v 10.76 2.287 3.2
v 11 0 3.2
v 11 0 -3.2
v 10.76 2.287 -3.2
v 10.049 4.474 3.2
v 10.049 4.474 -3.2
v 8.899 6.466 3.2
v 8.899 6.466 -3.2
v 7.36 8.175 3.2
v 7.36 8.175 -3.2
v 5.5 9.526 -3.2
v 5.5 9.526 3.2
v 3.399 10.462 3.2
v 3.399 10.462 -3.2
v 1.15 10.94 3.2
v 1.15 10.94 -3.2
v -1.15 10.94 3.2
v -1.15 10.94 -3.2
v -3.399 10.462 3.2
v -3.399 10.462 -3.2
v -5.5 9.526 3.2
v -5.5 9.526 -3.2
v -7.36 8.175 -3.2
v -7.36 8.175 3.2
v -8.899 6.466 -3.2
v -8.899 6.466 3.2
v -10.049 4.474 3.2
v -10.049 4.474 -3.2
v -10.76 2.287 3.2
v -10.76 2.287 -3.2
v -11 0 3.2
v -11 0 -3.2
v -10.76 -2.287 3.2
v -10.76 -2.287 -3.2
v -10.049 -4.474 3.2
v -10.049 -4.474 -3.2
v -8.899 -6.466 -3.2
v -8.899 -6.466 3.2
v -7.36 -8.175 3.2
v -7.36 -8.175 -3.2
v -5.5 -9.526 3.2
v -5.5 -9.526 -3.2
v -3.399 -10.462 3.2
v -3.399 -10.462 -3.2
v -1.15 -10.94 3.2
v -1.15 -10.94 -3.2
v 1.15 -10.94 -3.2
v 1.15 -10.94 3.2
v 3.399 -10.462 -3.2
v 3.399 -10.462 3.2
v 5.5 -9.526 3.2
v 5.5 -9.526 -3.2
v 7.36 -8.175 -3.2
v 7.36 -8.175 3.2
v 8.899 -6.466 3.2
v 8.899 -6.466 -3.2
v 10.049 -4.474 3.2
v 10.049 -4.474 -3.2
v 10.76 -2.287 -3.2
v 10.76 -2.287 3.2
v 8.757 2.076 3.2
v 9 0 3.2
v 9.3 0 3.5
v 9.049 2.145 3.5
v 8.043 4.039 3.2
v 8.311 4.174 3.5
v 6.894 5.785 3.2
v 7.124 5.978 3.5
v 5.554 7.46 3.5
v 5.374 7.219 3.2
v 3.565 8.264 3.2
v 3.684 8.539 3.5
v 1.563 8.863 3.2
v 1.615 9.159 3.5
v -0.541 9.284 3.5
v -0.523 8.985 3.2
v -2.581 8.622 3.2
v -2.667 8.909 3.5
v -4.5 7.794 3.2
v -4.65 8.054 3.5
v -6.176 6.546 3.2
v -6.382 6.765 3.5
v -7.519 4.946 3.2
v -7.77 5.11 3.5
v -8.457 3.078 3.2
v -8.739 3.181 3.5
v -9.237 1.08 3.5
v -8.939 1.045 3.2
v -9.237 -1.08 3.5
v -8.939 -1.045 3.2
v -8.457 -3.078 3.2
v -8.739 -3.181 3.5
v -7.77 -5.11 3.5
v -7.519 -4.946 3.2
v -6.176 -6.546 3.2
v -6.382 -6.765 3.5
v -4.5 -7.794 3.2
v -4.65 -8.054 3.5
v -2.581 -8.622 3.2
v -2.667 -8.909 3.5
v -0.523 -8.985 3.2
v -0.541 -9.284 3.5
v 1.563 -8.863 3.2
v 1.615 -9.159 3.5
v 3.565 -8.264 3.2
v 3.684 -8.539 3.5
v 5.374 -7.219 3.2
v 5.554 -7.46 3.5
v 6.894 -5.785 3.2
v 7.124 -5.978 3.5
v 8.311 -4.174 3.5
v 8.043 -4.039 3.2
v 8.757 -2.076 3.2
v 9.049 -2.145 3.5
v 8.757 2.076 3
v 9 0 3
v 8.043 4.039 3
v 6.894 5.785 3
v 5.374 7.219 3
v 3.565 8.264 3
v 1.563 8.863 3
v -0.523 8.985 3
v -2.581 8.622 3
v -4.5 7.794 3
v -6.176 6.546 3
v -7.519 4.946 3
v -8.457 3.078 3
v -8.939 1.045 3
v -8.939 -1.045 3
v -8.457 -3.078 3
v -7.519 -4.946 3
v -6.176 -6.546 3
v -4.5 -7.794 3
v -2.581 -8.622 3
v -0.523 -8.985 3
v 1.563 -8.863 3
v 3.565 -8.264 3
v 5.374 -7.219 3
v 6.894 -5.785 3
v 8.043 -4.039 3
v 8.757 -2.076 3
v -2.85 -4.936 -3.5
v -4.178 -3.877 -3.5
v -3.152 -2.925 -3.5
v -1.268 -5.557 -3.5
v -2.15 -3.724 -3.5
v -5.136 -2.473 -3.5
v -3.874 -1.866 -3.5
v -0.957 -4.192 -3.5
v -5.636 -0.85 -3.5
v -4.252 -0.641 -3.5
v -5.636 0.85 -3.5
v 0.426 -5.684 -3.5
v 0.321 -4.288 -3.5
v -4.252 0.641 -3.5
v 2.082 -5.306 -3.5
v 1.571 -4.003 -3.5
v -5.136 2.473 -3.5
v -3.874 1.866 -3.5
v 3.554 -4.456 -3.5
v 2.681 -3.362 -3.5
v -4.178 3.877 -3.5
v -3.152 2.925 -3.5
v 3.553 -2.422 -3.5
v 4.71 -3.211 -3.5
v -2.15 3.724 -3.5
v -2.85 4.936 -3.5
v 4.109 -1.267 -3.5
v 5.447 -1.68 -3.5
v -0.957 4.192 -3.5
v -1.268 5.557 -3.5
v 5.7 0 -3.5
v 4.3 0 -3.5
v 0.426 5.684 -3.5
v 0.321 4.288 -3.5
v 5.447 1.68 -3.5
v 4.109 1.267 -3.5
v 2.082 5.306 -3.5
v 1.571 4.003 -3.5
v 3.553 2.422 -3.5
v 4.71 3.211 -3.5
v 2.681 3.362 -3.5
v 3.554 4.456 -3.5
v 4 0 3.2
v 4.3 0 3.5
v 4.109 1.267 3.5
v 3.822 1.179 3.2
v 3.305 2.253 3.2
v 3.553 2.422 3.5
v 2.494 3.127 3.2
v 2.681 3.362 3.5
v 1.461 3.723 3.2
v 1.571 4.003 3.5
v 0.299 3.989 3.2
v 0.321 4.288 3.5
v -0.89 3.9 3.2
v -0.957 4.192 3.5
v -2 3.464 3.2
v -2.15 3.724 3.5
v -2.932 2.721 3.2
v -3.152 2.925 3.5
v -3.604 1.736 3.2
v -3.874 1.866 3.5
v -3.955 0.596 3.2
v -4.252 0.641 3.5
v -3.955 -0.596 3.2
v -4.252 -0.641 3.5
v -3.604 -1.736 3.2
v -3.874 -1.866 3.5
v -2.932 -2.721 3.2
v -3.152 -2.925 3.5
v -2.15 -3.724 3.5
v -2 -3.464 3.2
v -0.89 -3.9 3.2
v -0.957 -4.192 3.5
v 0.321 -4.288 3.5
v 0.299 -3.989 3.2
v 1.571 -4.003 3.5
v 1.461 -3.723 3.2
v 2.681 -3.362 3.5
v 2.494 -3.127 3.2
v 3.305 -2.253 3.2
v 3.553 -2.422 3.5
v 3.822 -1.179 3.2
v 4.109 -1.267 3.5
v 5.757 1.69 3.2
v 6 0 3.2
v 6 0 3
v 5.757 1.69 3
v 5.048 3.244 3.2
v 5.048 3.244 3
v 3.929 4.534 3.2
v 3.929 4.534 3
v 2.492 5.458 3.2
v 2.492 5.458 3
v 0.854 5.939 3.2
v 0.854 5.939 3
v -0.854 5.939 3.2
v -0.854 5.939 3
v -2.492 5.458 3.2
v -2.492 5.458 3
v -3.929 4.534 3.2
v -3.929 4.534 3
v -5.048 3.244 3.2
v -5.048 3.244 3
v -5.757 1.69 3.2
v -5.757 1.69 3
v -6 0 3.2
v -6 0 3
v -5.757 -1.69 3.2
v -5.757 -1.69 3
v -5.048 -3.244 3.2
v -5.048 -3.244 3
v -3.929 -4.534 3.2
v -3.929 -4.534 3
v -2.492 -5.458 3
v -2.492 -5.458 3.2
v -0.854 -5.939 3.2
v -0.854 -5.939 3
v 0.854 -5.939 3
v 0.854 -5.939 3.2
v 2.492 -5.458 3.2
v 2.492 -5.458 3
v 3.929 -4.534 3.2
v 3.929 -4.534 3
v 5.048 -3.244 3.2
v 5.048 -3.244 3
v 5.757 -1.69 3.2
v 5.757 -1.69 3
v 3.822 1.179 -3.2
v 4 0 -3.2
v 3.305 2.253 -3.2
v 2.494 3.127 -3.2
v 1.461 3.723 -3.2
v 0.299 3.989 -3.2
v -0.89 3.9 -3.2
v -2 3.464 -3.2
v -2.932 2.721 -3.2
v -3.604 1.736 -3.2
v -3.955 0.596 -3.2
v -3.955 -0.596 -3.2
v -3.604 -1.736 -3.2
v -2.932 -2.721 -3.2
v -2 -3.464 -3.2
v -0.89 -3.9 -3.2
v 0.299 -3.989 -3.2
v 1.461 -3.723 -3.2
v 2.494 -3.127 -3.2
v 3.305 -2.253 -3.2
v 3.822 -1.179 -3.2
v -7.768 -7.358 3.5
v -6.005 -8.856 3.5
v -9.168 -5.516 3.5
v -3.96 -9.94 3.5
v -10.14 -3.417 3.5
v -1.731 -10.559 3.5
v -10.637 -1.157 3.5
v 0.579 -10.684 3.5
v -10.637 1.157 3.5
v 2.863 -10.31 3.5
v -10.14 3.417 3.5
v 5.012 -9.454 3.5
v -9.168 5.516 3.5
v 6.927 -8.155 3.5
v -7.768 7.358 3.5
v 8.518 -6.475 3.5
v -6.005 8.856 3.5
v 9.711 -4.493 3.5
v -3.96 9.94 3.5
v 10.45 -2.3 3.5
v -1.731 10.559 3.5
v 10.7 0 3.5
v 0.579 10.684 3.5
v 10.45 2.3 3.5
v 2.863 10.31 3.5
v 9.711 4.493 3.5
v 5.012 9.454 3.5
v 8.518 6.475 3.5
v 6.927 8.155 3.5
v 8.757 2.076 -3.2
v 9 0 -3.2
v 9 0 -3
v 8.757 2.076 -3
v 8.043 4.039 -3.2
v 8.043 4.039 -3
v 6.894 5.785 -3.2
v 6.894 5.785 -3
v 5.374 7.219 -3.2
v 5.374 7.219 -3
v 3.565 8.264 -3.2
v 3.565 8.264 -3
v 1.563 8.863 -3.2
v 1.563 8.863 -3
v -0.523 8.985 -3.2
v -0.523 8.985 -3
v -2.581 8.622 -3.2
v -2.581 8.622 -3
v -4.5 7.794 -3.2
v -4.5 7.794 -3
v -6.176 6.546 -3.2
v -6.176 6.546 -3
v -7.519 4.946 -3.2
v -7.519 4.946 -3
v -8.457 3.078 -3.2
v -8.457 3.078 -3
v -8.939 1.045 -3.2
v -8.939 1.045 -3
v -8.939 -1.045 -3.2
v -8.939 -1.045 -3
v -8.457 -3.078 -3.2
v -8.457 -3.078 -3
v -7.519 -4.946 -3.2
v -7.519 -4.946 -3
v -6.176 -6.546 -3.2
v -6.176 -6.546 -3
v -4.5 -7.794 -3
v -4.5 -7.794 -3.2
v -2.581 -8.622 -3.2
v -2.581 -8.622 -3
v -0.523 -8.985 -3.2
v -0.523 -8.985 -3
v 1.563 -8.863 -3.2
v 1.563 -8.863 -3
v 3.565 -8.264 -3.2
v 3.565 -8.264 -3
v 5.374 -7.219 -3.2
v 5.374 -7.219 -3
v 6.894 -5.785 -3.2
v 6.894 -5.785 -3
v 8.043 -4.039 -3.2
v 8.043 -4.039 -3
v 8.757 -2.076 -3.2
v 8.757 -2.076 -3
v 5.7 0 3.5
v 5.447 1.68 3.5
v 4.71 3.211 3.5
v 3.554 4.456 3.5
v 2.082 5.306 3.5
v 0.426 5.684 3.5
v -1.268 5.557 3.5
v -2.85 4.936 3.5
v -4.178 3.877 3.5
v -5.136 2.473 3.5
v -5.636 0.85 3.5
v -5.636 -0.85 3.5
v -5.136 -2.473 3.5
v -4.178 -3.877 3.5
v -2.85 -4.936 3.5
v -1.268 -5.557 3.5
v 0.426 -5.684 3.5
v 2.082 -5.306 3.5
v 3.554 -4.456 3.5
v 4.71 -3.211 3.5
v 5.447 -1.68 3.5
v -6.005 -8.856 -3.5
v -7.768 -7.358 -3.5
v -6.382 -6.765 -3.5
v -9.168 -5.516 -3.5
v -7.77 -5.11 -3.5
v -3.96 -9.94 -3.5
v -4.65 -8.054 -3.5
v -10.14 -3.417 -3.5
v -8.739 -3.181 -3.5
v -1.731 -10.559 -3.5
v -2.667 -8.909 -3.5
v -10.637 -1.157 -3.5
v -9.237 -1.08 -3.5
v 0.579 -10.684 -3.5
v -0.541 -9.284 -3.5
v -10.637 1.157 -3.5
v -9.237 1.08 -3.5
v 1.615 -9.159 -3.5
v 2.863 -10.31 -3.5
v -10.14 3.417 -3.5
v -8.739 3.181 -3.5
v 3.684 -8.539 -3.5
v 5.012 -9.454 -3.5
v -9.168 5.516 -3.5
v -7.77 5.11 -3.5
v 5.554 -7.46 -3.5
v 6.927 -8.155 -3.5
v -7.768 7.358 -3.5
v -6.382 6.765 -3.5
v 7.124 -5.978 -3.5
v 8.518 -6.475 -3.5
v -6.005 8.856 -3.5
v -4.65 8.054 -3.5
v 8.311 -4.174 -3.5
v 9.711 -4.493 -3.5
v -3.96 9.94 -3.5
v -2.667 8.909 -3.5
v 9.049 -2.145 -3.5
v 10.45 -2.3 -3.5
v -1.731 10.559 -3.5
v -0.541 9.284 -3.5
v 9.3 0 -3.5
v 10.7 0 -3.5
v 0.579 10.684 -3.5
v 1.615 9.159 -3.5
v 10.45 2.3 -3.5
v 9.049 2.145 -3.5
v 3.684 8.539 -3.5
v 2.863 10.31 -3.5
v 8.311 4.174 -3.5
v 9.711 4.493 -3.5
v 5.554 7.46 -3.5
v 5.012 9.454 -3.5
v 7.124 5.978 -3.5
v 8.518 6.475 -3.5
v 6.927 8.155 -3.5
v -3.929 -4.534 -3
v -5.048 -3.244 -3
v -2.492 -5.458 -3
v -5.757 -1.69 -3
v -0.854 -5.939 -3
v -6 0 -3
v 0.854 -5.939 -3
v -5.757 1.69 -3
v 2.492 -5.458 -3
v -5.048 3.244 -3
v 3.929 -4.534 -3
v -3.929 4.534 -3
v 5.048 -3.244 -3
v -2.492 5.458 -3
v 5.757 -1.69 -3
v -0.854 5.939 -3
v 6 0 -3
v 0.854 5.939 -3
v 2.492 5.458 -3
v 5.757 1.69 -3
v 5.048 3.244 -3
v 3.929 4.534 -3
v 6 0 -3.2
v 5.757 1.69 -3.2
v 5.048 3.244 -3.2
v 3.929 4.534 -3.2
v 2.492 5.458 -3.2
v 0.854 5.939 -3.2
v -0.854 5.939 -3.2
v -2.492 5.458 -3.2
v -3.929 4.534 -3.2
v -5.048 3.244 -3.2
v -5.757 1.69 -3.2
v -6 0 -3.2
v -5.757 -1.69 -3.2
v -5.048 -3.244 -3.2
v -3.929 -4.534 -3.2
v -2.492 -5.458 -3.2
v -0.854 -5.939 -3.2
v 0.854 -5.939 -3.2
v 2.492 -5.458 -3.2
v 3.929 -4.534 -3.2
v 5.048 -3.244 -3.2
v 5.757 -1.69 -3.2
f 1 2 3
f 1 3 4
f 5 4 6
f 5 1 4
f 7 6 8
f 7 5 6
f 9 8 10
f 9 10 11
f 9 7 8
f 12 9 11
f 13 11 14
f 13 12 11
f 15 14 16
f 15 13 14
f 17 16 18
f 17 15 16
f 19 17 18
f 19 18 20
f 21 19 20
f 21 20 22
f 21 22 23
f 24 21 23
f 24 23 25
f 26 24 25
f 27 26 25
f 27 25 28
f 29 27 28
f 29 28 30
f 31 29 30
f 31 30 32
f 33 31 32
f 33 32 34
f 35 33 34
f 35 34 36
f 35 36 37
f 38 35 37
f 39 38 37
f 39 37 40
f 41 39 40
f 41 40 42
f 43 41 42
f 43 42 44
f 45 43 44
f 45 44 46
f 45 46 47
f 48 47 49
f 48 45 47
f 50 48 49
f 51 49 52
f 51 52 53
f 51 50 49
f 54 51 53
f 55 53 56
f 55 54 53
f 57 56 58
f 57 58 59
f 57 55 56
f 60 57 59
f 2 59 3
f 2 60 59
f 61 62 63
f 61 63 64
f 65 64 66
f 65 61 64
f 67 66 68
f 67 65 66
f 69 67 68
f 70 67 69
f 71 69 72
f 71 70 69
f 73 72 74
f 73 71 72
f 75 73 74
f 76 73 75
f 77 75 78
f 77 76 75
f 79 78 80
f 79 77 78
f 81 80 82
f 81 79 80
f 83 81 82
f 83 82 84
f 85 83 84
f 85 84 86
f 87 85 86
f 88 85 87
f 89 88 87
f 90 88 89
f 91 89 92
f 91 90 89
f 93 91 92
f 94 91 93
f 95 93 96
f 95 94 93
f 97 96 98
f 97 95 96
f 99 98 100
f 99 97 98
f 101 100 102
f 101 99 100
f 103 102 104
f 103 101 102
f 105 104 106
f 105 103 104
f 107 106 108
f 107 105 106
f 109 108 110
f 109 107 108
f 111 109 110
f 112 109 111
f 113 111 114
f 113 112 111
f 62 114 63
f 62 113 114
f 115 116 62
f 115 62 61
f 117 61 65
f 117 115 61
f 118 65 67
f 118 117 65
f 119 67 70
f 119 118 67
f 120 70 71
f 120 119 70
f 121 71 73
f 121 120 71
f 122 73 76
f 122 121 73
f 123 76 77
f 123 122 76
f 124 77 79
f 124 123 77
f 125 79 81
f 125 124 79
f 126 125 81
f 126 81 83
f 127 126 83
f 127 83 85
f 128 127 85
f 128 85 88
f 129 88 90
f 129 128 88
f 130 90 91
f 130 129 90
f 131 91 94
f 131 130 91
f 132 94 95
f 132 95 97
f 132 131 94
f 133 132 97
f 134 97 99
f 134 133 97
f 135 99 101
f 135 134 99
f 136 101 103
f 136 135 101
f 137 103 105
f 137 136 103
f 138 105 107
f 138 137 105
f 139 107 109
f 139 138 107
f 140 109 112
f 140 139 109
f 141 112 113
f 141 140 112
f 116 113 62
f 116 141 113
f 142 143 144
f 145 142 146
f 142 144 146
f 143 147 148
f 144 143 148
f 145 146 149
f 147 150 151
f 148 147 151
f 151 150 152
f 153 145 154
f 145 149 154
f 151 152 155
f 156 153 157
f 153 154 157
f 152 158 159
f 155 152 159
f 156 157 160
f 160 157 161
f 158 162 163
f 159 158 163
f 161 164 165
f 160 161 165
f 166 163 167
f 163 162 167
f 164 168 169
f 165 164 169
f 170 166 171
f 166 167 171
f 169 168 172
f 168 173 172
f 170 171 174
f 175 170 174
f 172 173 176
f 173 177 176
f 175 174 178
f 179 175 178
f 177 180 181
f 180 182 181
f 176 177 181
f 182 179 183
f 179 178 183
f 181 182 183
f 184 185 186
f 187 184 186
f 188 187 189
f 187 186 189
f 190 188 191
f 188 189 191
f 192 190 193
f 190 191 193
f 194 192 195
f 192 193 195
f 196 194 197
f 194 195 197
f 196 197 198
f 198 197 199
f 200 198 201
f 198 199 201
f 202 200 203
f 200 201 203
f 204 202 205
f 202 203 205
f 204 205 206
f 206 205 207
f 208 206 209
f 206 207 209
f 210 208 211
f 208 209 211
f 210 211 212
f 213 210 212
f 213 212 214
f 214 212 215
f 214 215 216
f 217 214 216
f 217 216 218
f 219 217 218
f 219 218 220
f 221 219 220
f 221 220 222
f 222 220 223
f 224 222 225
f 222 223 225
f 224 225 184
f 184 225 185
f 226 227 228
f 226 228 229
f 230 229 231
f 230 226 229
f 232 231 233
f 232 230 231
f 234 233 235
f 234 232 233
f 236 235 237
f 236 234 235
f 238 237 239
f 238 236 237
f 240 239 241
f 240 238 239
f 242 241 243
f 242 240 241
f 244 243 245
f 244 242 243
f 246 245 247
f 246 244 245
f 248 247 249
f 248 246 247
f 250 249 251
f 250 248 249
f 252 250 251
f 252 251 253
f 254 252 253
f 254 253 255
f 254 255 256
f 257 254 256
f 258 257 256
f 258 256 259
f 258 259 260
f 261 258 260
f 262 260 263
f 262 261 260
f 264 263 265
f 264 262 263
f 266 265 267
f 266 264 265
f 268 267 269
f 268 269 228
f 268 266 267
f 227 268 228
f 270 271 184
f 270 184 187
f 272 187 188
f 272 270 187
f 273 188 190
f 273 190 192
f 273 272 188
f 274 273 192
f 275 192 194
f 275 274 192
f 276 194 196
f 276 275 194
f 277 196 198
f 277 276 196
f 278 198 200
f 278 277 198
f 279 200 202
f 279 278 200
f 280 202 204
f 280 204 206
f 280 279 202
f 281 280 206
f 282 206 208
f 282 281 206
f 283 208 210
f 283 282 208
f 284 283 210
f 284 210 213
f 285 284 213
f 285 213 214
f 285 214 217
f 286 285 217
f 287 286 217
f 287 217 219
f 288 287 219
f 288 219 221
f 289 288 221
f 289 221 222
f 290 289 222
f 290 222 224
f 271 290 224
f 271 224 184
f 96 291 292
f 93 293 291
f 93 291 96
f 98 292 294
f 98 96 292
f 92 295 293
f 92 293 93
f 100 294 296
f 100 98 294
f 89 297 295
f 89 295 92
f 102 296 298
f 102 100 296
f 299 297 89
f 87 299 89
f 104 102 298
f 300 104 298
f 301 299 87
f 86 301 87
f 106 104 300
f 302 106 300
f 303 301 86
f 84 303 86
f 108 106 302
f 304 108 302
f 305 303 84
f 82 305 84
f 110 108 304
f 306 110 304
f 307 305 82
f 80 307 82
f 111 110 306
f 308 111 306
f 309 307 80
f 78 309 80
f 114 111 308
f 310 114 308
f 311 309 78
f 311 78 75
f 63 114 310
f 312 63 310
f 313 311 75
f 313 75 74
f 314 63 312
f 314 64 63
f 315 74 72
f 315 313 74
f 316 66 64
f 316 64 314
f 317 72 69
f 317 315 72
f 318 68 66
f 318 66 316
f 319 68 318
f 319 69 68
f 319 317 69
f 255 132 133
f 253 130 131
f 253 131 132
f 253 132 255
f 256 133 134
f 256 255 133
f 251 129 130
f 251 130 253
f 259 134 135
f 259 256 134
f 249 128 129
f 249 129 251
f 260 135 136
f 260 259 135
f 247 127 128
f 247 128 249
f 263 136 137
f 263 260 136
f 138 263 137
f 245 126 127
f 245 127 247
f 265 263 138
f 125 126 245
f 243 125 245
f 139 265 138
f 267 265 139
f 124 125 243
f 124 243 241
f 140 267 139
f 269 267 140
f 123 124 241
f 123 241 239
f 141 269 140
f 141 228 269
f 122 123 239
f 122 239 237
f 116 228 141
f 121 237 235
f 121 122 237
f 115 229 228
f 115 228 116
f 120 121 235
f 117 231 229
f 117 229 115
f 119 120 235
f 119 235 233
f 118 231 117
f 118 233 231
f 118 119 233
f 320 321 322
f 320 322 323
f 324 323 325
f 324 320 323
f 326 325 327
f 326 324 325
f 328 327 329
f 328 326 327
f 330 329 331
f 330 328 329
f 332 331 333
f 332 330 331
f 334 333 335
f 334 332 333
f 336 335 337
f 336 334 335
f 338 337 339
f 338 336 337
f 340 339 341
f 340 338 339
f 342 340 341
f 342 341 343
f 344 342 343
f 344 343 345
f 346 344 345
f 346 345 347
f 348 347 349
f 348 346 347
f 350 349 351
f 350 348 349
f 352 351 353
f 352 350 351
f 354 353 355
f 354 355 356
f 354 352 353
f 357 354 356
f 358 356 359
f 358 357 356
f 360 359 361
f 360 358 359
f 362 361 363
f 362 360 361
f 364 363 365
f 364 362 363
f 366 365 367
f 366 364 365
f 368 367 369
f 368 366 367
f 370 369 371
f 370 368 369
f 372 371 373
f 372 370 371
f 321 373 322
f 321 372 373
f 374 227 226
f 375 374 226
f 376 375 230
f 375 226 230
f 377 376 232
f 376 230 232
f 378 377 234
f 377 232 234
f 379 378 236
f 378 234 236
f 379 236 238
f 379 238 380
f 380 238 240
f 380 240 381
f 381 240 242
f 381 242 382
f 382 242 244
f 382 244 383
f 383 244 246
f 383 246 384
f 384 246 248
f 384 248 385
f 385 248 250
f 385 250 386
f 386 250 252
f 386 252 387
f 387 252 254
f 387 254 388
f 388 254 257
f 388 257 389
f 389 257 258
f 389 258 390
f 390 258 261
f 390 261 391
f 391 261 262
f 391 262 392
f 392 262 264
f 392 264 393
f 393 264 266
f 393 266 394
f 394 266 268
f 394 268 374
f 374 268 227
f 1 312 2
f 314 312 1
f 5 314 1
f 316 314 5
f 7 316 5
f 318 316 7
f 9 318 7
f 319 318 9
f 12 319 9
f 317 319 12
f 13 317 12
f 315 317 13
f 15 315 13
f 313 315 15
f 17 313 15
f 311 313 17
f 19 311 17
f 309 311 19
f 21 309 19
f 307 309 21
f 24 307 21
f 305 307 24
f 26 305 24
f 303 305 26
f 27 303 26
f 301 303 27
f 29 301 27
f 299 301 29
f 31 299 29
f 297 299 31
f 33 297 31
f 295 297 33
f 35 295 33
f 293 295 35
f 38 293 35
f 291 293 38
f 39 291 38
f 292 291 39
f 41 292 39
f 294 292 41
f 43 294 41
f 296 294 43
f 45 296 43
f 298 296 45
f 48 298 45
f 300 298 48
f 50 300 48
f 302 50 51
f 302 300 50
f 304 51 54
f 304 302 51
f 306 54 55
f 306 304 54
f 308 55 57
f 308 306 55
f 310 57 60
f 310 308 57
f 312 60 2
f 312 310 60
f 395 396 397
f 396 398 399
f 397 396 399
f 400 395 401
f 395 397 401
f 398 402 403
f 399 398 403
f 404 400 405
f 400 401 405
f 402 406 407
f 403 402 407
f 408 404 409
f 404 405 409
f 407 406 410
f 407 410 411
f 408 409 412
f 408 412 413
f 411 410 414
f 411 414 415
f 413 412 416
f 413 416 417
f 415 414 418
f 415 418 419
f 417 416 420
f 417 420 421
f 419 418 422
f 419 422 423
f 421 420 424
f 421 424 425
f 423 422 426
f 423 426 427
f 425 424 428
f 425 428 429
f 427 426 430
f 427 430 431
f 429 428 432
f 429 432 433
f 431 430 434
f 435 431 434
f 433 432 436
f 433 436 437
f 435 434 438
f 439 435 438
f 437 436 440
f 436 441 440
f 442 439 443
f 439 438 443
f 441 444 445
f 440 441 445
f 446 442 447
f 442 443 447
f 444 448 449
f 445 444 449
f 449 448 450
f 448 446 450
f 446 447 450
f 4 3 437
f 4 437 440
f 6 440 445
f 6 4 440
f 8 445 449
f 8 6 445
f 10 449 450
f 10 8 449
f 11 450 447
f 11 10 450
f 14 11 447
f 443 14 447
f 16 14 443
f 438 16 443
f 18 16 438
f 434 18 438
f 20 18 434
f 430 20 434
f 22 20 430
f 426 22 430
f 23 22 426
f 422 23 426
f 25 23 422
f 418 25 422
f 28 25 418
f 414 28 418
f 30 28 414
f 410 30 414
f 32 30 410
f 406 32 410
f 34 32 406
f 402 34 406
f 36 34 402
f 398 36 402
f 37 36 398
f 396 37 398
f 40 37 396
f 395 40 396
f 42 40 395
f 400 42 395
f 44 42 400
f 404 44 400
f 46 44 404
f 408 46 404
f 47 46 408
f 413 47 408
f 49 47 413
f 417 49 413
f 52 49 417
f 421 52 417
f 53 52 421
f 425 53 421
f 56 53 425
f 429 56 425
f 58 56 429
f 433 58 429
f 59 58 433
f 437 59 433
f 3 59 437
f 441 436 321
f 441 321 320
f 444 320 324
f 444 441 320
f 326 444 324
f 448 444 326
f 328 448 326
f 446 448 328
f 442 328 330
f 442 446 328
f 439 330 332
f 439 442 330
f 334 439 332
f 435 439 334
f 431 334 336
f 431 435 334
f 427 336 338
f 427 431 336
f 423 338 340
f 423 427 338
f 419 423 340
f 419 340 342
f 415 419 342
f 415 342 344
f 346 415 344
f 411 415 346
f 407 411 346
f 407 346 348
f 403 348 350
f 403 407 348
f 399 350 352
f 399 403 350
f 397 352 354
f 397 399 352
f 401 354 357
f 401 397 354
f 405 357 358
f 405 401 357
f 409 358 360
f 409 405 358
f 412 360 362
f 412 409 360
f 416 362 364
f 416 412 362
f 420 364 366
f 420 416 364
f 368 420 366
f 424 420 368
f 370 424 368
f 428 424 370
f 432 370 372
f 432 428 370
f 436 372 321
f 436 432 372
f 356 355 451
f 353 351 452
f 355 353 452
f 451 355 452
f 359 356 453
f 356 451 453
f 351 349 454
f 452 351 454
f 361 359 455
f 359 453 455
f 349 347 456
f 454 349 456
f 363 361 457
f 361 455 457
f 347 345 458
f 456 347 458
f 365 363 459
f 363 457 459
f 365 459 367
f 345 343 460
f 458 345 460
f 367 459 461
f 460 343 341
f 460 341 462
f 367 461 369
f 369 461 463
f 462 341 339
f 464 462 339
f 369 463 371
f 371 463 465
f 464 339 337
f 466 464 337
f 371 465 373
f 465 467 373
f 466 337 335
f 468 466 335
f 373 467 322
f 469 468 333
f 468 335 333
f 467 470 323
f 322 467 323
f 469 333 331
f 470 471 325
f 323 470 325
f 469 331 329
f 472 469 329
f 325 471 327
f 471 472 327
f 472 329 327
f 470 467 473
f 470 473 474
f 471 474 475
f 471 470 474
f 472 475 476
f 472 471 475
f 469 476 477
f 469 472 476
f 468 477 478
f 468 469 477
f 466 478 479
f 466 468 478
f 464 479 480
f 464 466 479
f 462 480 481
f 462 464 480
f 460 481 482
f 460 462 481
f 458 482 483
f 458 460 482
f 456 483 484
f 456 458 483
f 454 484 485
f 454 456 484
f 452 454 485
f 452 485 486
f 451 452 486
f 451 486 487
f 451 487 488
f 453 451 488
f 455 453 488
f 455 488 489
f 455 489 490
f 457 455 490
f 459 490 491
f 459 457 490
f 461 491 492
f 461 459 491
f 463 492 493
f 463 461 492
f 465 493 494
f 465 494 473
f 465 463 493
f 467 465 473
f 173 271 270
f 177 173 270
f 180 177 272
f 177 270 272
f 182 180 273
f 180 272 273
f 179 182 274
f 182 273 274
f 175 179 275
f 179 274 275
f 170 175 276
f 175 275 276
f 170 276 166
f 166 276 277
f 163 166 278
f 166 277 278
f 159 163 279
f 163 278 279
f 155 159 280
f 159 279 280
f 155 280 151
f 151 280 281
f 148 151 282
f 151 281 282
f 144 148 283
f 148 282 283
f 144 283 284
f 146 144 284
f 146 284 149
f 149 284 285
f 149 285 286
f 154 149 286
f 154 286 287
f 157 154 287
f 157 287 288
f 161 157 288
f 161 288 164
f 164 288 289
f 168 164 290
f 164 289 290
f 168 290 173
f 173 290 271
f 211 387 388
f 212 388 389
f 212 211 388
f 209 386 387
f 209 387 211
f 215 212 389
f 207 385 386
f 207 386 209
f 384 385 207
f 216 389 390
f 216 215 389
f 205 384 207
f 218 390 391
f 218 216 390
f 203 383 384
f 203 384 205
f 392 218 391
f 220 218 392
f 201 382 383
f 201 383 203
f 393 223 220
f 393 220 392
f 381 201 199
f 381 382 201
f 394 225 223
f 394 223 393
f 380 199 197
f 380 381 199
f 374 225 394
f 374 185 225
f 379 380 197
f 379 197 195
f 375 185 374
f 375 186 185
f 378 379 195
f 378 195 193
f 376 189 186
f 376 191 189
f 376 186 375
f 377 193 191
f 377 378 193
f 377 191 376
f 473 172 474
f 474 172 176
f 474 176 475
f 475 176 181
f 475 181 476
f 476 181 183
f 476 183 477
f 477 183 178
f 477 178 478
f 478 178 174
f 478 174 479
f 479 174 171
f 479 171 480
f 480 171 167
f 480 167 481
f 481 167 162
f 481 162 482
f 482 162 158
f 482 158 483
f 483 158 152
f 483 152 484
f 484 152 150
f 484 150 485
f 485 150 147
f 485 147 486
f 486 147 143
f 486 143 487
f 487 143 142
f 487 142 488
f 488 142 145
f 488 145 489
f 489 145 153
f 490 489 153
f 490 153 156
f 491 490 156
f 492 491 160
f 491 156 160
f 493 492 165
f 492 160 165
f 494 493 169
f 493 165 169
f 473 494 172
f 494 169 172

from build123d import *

# Parameters (mm, degrees)
F0_R     = 11
F0_R_2   = 9
F1_DEPTH = 3.5
F0_R_3   = 6
F0_R_4   = 4
F2_DEPTH = 3
F3_SIZE  = 0.3


with BuildPart() as f1:
    # F0 (on Top) → F1 (new body, symmetric)
    with BuildSketch(Plane.XY):
        Circle(F0_R)
        Circle(F0_R_2, mode=Mode.SUBTRACT)
    extrude(amount=F1_DEPTH, both=True)



with BuildPart() as f1b:
    # F0 (on Top) → F1, piece 2 (new body, symmetric)
    with BuildSketch(Plane.XY):
        Circle(F0_R_3)
        Circle(F0_R_4, mode=Mode.SUBTRACT)
    extrude(amount=F1_DEPTH, both=True)


with BuildPart() as f1_1:
    add(f1.part)

    add(f1b.part)  # F2 merges F1b
    # F0 (on Top) → F2 (join, symmetric)
    with BuildSketch(Plane.XY):
        Circle(F0_R_2)
        Circle(F0_R_3, mode=Mode.SUBTRACT)
    extrude(amount=F2_DEPTH, both=True)

    # F3
    f3_edges = [f1_1.edges().sort_by_distance(p)[0] for p in [
        (-11, 0, 3.5),
        (-4, 0, 3.5),
        (-9, 0, 3.5),
        (-6, 0, 3.5),
        (-11, 0, -3.5),
        (-9, 0, -3.5),
        (-6, 0, -3.5),
        (-4, 0, -3.5),
    ]]
    chamfer(f3_edges, length=F3_SIZE)


solid = f1_1.part
